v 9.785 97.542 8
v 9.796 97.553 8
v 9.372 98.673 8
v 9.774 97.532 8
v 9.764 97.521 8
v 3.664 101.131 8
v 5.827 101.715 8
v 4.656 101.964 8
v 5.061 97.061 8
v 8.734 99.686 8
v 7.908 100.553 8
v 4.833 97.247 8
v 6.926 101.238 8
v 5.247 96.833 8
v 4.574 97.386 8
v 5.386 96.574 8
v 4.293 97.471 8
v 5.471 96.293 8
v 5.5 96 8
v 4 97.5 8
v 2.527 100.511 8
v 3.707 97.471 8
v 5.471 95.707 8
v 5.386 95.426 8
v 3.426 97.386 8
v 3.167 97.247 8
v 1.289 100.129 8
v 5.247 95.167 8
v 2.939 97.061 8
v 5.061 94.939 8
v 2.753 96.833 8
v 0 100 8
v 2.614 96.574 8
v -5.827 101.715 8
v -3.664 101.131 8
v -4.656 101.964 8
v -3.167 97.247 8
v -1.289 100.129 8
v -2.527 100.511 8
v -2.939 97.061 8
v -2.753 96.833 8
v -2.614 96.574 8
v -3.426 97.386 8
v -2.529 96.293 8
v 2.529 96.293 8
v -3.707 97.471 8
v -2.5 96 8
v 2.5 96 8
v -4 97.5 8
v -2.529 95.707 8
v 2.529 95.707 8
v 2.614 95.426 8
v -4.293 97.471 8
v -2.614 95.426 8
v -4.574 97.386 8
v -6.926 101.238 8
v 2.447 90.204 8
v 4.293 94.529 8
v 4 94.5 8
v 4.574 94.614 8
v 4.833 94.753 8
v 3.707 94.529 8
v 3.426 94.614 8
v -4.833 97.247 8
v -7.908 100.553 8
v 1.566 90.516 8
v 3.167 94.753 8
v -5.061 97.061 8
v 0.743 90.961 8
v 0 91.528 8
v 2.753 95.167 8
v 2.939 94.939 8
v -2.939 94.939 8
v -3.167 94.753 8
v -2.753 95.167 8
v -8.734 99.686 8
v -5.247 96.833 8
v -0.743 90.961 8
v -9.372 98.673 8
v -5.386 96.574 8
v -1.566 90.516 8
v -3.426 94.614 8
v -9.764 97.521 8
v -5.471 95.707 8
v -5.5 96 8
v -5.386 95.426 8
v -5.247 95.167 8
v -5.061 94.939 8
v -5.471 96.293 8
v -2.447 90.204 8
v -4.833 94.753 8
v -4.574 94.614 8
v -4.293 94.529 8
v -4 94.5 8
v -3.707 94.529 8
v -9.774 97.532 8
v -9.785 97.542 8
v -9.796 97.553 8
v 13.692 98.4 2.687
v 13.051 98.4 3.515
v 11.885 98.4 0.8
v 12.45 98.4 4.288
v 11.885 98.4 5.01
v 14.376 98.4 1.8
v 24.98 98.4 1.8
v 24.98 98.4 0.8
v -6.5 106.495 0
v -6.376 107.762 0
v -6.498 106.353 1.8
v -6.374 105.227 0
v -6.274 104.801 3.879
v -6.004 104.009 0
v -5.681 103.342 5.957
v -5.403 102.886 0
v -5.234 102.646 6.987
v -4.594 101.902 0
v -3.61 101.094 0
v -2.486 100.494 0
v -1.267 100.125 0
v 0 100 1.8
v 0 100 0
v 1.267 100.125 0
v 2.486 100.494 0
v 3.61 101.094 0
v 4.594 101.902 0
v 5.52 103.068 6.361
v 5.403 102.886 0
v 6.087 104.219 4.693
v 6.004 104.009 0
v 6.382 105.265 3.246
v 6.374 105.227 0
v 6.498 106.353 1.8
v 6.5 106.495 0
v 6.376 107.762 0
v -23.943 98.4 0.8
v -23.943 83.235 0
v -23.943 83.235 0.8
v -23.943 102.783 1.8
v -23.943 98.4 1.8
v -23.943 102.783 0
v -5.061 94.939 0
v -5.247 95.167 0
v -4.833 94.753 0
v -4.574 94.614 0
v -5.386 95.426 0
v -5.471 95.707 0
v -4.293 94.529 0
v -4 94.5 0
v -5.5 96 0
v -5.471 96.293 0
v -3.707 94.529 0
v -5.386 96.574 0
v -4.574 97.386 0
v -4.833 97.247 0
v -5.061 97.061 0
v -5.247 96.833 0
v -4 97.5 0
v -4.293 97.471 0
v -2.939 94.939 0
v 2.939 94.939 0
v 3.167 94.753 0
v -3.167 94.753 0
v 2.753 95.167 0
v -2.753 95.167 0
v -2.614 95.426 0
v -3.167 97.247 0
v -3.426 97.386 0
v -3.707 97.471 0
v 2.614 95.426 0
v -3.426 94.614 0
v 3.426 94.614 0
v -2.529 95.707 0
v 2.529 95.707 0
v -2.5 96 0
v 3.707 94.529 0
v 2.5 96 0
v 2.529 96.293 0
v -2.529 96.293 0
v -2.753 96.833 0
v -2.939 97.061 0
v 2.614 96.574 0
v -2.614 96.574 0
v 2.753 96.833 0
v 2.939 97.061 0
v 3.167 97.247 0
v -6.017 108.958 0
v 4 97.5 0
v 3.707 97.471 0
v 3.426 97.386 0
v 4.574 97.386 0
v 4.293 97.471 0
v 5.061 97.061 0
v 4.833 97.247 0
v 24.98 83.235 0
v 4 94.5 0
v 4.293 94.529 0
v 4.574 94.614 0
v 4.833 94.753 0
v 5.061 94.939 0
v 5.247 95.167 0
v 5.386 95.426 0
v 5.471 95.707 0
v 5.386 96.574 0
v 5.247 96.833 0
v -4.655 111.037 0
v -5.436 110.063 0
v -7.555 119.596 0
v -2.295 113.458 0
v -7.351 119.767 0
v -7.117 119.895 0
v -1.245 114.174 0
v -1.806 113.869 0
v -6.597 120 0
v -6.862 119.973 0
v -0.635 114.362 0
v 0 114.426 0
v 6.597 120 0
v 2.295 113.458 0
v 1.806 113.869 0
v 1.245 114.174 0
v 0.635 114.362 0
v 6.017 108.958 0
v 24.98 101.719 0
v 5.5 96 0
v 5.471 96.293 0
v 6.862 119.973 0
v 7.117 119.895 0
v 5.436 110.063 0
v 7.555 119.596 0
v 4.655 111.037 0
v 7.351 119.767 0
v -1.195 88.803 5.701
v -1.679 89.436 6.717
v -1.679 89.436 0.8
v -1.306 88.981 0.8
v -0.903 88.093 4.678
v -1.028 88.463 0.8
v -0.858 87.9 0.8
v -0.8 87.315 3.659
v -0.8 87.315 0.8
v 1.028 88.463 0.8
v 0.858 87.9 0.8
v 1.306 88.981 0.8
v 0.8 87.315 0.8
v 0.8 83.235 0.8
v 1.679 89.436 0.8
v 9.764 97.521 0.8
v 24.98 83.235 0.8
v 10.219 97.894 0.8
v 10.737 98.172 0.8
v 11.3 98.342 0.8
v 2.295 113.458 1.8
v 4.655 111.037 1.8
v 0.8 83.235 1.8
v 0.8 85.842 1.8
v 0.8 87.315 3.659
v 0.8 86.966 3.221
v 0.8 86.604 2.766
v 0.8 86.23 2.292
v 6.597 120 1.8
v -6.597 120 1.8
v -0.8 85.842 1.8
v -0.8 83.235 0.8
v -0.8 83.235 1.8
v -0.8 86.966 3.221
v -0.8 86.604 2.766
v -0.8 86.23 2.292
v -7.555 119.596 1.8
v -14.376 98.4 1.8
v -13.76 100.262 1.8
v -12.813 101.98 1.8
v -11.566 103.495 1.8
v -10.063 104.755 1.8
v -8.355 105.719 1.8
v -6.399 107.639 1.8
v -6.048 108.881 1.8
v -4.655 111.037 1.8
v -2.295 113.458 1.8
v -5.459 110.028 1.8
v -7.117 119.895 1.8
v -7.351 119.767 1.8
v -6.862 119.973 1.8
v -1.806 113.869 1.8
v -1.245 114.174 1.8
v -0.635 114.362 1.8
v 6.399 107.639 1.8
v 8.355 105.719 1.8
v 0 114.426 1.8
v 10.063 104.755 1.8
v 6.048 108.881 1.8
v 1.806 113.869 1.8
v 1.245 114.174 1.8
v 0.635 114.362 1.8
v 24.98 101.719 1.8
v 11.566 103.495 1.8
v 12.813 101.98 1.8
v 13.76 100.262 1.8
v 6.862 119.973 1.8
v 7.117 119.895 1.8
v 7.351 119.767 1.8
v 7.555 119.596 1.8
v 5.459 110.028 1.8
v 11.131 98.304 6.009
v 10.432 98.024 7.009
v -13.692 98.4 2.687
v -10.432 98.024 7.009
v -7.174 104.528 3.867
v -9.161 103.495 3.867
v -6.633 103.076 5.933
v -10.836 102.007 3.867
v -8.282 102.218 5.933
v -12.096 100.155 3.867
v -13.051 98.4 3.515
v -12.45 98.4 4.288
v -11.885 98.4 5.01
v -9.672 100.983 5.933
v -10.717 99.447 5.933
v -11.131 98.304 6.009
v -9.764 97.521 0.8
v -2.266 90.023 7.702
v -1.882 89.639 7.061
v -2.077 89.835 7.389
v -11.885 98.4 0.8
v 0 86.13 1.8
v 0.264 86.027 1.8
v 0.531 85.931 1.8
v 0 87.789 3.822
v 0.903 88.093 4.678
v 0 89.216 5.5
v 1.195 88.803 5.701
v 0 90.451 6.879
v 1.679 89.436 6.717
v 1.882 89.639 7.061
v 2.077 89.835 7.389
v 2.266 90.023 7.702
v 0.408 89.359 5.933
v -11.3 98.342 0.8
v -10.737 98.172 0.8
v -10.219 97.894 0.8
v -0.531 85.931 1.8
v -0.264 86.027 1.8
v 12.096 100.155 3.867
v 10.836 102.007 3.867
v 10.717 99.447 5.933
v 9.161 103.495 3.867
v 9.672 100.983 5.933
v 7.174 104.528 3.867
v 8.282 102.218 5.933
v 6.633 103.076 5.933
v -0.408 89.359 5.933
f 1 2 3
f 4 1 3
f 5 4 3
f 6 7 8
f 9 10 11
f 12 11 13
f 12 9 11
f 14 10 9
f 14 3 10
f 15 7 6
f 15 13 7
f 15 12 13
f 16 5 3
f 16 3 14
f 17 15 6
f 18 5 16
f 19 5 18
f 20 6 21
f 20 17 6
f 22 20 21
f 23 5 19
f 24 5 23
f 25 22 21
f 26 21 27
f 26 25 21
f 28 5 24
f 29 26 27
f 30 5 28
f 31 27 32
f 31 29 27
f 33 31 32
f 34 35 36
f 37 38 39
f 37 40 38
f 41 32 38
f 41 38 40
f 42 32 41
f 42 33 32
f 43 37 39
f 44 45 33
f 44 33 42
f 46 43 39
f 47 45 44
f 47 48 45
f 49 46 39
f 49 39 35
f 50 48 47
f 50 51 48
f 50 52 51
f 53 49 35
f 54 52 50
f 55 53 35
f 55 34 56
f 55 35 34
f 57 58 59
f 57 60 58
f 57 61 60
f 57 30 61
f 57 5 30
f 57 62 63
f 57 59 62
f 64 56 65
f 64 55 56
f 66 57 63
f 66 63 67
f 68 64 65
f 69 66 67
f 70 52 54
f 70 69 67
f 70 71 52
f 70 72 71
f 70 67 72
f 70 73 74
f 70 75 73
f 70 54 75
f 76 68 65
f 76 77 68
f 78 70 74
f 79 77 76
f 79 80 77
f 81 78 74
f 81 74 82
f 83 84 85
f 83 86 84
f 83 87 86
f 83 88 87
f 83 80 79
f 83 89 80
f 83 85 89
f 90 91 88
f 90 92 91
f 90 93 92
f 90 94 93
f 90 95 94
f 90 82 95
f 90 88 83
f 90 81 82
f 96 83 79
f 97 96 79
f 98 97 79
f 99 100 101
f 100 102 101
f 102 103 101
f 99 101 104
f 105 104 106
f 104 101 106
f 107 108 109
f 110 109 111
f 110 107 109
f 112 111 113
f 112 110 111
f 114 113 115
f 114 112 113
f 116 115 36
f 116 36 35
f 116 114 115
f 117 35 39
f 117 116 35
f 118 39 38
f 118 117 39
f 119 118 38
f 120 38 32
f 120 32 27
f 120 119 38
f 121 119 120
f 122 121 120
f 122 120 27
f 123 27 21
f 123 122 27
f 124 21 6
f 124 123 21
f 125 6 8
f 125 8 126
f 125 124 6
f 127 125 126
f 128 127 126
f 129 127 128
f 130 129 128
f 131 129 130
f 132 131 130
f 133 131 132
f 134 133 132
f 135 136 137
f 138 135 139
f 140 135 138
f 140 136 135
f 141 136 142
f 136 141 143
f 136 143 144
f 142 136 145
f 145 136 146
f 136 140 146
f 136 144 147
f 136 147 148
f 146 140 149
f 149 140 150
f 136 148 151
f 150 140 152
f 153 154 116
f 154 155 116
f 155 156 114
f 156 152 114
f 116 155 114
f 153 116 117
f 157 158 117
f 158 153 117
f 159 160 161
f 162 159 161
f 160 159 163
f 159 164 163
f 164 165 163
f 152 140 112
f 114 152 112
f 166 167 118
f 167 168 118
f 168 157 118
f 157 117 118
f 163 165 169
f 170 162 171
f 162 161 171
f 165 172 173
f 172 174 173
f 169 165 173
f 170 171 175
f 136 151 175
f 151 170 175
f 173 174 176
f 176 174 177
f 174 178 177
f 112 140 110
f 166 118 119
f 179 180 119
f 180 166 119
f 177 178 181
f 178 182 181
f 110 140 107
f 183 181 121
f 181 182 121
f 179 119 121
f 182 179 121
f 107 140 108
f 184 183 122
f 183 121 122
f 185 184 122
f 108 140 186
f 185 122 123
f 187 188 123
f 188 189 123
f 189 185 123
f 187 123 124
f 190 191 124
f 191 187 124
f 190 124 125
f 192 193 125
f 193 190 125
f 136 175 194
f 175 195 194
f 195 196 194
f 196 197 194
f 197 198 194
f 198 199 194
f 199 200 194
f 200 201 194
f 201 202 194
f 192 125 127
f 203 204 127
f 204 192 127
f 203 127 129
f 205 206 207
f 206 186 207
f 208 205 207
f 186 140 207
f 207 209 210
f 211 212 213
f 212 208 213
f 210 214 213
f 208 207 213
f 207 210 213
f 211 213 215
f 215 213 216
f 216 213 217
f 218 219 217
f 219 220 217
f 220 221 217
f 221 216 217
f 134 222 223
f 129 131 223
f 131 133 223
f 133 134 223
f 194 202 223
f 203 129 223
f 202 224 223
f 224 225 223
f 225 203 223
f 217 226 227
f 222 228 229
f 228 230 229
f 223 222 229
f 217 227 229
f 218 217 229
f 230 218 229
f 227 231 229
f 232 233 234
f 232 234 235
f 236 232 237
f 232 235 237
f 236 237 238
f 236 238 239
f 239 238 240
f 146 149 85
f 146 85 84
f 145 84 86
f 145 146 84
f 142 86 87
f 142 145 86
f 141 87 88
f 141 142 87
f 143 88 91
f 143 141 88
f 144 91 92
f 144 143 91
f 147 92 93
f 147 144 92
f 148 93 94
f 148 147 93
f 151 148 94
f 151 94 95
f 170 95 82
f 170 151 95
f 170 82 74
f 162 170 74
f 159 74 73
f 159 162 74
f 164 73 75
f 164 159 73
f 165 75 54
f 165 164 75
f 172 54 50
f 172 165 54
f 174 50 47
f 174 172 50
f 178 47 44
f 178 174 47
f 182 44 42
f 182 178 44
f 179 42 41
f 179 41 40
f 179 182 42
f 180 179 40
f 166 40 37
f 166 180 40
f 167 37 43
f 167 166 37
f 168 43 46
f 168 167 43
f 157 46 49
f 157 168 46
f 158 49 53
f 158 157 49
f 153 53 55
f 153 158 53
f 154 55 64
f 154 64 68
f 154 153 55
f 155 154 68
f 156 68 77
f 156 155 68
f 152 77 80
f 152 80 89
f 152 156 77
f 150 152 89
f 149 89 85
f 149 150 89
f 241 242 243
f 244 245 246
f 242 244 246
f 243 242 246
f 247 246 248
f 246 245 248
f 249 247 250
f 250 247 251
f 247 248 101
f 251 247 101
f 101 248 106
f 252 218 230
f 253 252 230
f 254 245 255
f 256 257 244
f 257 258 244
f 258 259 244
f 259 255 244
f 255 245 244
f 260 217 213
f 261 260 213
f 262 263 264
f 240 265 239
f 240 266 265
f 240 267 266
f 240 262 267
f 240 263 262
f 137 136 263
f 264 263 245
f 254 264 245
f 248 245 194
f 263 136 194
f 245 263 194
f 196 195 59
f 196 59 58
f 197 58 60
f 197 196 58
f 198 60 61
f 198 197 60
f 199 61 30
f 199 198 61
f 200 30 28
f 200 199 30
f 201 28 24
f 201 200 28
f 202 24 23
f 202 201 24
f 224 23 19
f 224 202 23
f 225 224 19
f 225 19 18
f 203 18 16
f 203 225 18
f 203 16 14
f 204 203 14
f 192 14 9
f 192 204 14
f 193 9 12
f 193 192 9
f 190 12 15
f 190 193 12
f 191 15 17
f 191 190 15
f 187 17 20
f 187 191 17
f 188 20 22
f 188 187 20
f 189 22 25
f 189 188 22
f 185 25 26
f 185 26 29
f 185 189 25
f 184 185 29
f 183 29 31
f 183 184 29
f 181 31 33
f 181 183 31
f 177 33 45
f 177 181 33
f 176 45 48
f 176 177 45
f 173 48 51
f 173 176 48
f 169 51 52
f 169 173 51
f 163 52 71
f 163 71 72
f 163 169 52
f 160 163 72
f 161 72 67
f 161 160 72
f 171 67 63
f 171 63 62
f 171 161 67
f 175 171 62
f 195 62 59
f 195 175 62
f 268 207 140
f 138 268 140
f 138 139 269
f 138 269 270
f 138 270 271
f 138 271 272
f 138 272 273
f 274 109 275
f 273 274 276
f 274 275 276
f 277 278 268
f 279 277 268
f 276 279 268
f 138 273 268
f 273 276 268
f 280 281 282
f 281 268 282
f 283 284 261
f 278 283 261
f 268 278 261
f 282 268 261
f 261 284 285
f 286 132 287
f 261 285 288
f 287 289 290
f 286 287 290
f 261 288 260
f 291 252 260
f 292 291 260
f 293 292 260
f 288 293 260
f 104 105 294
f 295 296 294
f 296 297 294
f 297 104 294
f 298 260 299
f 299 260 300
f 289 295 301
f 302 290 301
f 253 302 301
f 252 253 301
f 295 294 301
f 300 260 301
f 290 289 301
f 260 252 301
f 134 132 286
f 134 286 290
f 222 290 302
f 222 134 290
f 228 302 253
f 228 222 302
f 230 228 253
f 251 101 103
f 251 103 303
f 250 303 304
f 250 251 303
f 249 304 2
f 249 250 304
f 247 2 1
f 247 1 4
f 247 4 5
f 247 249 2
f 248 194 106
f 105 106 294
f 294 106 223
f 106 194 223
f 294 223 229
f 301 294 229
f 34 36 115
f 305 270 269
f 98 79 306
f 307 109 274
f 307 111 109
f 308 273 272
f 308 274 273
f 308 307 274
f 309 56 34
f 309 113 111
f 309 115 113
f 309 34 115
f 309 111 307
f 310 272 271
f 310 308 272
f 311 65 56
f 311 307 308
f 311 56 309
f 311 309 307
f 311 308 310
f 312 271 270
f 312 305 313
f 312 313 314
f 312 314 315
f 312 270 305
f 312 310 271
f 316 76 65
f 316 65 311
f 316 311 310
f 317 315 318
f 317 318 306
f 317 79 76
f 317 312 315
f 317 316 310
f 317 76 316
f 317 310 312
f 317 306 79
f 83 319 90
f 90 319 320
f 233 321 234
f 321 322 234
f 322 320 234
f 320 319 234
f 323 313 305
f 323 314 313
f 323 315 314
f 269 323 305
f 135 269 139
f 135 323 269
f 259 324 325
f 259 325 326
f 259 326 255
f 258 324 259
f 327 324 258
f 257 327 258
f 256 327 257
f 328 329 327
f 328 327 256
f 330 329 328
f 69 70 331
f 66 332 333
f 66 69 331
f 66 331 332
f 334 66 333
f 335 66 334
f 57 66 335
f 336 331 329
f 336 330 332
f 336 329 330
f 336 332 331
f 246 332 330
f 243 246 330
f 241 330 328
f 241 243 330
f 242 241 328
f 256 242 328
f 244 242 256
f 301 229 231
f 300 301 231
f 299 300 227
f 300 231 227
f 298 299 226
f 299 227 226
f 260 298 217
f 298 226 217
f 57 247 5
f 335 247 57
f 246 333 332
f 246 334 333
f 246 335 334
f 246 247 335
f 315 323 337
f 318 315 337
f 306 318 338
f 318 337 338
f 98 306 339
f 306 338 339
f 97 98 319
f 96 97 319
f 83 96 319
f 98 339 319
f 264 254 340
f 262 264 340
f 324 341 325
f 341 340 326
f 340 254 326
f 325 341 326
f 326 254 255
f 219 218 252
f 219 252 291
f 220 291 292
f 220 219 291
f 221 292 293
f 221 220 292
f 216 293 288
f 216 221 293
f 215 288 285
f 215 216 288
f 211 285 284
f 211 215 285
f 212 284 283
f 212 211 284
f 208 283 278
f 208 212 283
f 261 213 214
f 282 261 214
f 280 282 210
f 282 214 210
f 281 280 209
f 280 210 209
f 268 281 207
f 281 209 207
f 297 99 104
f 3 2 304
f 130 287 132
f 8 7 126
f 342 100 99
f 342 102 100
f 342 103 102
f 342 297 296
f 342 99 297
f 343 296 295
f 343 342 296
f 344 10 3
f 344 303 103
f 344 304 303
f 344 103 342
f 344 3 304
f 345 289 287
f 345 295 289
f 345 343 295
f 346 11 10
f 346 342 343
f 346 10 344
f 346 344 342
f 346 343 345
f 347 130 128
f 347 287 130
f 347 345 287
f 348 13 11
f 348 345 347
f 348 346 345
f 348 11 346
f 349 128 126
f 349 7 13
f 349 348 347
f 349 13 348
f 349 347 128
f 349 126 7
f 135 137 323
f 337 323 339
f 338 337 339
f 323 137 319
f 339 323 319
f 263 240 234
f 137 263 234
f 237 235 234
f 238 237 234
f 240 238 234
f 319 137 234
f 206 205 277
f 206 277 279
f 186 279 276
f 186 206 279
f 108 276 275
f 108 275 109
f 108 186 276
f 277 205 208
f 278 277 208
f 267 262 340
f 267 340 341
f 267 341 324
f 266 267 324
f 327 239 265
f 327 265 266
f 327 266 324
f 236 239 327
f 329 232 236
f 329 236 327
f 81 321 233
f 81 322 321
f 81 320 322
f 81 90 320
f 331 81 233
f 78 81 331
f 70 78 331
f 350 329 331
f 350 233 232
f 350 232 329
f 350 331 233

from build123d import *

# Parameters (mm, degrees)
CYLINDER_R       = 1.5
CYLINDER_DEPTH   = 8
ARRAY001_COUNT   = 4
ARRAY004_COUNT   = 4
EXTRUDE003_DEPTH = 1.8
EXTRUDE002_DEPTH = 0.8
ARRAY006_COUNT   = 4
EXTRUDE_DEPTH    = 1
ARRAY002_COUNT   = 4
EXTRUDE006_DEPTH = 1.8
EXTRUDE004_DEPTH = 10
EXTRUDE001_DEPTH = 8
ARRAY005_COUNT   = 4
ARRAY_COUNT      = 4
ARRAY003_COUNT   = 4
SKETCH003_W      = 48.922418
SKETCH003_H      = 39.225639
EXTRUDE005_DEPTH = 10


with BuildPart() as holes:
    # Cylinder → Cylinder (new body)
    with BuildSketch(Plane(origin=(4, 4, 0), x_dir=(1, 0, 0), z_dir=(0, 0, 1))):
        Circle(CYLINDER_R)
    extrude(amount=CYLINDER_DEPTH)

    # Array001: holes ×4 about axis
    array001_axis = Axis((50, 50, 0), (0, 0, 1))


with BuildPart() as holes_1:
    add(holes.part)
    for i in range(1, ARRAY001_COUNT):
        add(holes.part.rotate(array001_axis, i * 360 / ARRAY001_COUNT))

    # Array004: holes ×4 about axis
    array004_axis = Axis((0, 0, 0), (0, 0, 1))


with BuildPart() as holes_2:
    add(holes_1.part)
    for i in range(1, ARRAY004_COUNT):
        add(holes_1.part.rotate(array004_axis, i * 360 / ARRAY004_COUNT))


with BuildPart() as top_hook:
    # Sketch002 → Extrude003 (new body)
    with BuildSketch(Plane.XY):
        with BuildLine():
            Line((26.654903, 100), (7.555178, 119.595928))
            ThreePointArc((7.555178, 119.595928), (7.116991, 119.89485), (6.597081, 120))
            Line((6.597081, 120), (0, 120))
            Line((-6.597081, 120), (0, 120))
            ThreePointArc((-6.597081, 120), (-7.116991, 119.89485), (-7.555178, 119.595928))
            Line((-7.555178, 119.595928), (-26.654903, 100))
            Line((-26.654903, 100), (0, 100))
            Line((0, 100), (26.654903, 100))
        make_face()
        with BuildLine():
            ThreePointArc((-4.654749, 111.036883), (0, 100), (4.654749, 111.036883))
            Line((2.294641, 113.458306), (4.654749, 111.036883))
            ThreePointArc((2.294641, 113.458306), (0, 114.426059), (-2.294641, 113.458306))
            Line((-4.654749, 111.036883), (-2.294641, 113.458306))
        make_face(mode=Mode.SUBTRACT)
    extrude(amount=EXTRUDE003_DEPTH)


with BuildPart() as extrude002:
    # Sketch001 → Extrude002 (new body)
    with BuildSketch(Plane.XY):
        with BuildLine():
            Line((0, 100), (96, 100))
            ThreePointArc((98.828427, 98.828427), (97.530734, 99.695518), (96, 100))
            Line((96, 96), (98.828427, 98.828427))
            Line((4, 4), (96, 96))
            Line((0, 0), (4, 4))
            Line((0, 0), (0, 100))
        make_face()
    extrude(amount=EXTRUDE002_DEPTH)


with BuildPart() as bottom_plate:
    # Part__Mirroring002: instance of Extrude002
    add(extrude002.part.mirror(Plane(origin=(0, 0, 0), x_dir=(1, 0, 0), z_dir=(0, 1, 0))))

    # Fusion003: union Extrude002
    add(extrude002.part)

    # Array006: bottom_plate ×4 about axis
    array006_axis = Axis((0, 0, 0), (0, 0, 1))


with BuildPart() as bottom_plate_1:
    add(bottom_plate.part)
    for i in range(1, ARRAY006_COUNT):
        add(bottom_plate.part.rotate(array006_axis, i * 360 / ARRAY006_COUNT))


with BuildPart() as extrude_body:
    # Sketch → Extrude (new body)
    with BuildSketch(Plane.XY):
        with BuildLine():
            Line((0, 100), (96, 100))
            ThreePointArc((98.828427, 98.828427), (97.530734, 99.695518), (96, 100))
            Line((96, 96), (98.828427, 98.828427))
            Line((4, 4), (96, 96))
            Line((0, 0), (4, 4))
            Line((0, 0), (0, 100))
        make_face()
        with BuildLine():
            Line((0.8, 10.565655), (0.8, 87.314719))
            ThreePointArc((1.67868, 89.436039), (1.028361, 88.462769), (0.8, 87.314719))
            Line((9.763961, 97.52132), (1.67868, 89.436039))
            ThreePointArc((11.885281, 98.4), (10.737231, 98.171639), (9.763961, 97.52132))
            Line((11.885281, 98.4), (90.032525, 98.4))
            ThreePointArc((92.151931, 93.283302), (92.801662, 96.549722), (90.032525, 98.4))
            Line((6.905361, 8.036732), (92.151931, 93.283302))
            ThreePointArc((0.8, 10.565655), (3.007794, 7.261458), (6.905361, 8.036732))
        make_face(mode=Mode.SUBTRACT)
    extrude(amount=EXTRUDE_DEPTH)


with BuildPart() as extrude_body_1:
    # Extrude placement: moved
    add(extrude_body.part.moved(Location((0, 0, 0.8))))


with BuildPart() as fusion002:
    # Part__Mirroring: instance of Extrude body
    add(extrude_body_1.part.mirror(Plane(origin=(0, 0, 0), x_dir=(1, 0, 0), z_dir=(0, 1, 0))))

    # Fusion: union Extrude body
    add(extrude_body_1.part)

    # Array002: Fusion002 ×4 about axis
    array002_axis = Axis((0, 0, 0), (0, 0, 1))


with BuildPart() as fusion002_1:
    add(fusion002.part)
    for i in range(1, ARRAY002_COUNT):
        add(fusion002.part.rotate(array002_axis, i * 360 / ARRAY002_COUNT))

    # Fusion002: union bottom_plate
    add(bottom_plate_1.part)


with BuildPart() as extrude006:
    # Sketch004 → Extrude006 (new body)
    with BuildSketch(Plane.XY):
        with BuildLine():
            Line((-65.833333, 100), (-50, 100))
            Line((-50, 100), (-50, 120))
            Line((-71.666667, 120), (-50, 120))
            ThreePointArc((-71.666667, 120), (-75, 116.666667), (-71.666667, 113.333333))
            Line((-65.833333, 113.333333), (-71.666667, 113.333333))
            ThreePointArc((-62.5, 110), (-63.476311, 112.357023), (-65.833333, 113.333333))
            Line((-62.5, 103.333333), (-62.5, 110))
            ThreePointArc((-65.833333, 100), (-63.476311, 100.976311), (-62.5, 103.333333))
        make_face()
    extrude(amount=EXTRUDE006_DEPTH)


with BuildPart() as part_mirroring003:
    # Part__Mirroring003: instance of Extrude006
    add(extrude006.part.mirror(Plane(origin=(-50, 0, 0), x_dir=(0, -1, 0), z_dir=(1, 0, 0))))


with BuildPart() as cable_hook:
    # Fusion006 base: copy of Extrude006
    add(extrude006.part)

    # Fusion006: union Part__Mirroring003
    add(part_mirroring003.part)


with BuildPart() as hook_zone:
    # Sketch002 → Extrude004 (new body)
    with BuildSketch(Plane.XY):
        with BuildLine():
            Line((26.654903, 100), (7.555178, 119.595928))
            ThreePointArc((7.555178, 119.595928), (7.116991, 119.89485), (6.597081, 120))
            Line((6.597081, 120), (0, 120))
            Line((-6.597081, 120), (0, 120))
            ThreePointArc((-6.597081, 120), (-7.116991, 119.89485), (-7.555178, 119.595928))
            Line((-7.555178, 119.595928), (-26.654903, 100))
            Line((-26.654903, 100), (0, 100))
            Line((0, 100), (26.654903, 100))
        make_face()
        with BuildLine():
            ThreePointArc((-4.654749, 111.036883), (0, 100), (4.654749, 111.036883))
            Line((2.294641, 113.458306), (4.654749, 111.036883))
            ThreePointArc((2.294641, 113.458306), (0, 114.426059), (-2.294641, 113.458306))
            Line((-4.654749, 111.036883), (-2.294641, 113.458306))
        make_face(mode=Mode.SUBTRACT)
    extrude(amount=EXTRUDE004_DEPTH)


with BuildPart() as extrude001:
    # Sketch → Extrude001 (new body)
    with BuildSketch(Plane.XY):
        with BuildLine():
            Line((0, 100), (96, 100))
            ThreePointArc((98.828427, 98.828427), (97.530734, 99.695518), (96, 100))
            Line((96, 96), (98.828427, 98.828427))
            Line((4, 4), (96, 96))
            Line((0, 0), (4, 4))
            Line((0, 0), (0, 100))
        make_face()
        with BuildLine():
            Line((0.8, 10.565655), (0.8, 87.314719))
            ThreePointArc((1.67868, 89.436039), (1.028361, 88.462769), (0.8, 87.314719))
            Line((9.763961, 97.52132), (1.67868, 89.436039))
            ThreePointArc((11.885281, 98.4), (10.737231, 98.171639), (9.763961, 97.52132))
            Line((11.885281, 98.4), (90.032525, 98.4))
            ThreePointArc((92.151931, 93.283302), (92.801662, 96.549722), (90.032525, 98.4))
            Line((6.905361, 8.036732), (92.151931, 93.283302))
            ThreePointArc((0.8, 10.565655), (3.007794, 7.261458), (6.905361, 8.036732))
        make_face(mode=Mode.SUBTRACT)
    extrude(amount=EXTRUDE001_DEPTH)


with BuildPart() as zone_to_cut:
    # Part__Mirroring001: instance of Extrude001
    add(extrude001.part.mirror(Plane(origin=(0, 0, 0), x_dir=(1, 0, 0), z_dir=(0, 1, 0))))

    # Fusion001: union Extrude001
    add(extrude001.part)

    # Array005: zone_to_cut ×4 about axis
    array005_axis = Axis((0, 0, 0), (0, 0, 1))


with BuildPart() as zone_to_cut_1:
    add(zone_to_cut.part)
    for i in range(1, ARRAY005_COUNT):
        add(zone_to_cut.part.rotate(array005_axis, i * 360 / ARRAY005_COUNT))

    # Fusion004: union hook_zone
    add(hook_zone.part)


with BuildPart() as cut:
    # Cone → Cone (revolve)
    with BuildSketch(Plane(origin=(4, 4, 0), x_dir=(1, 0, 0), z_dir=(0, -1, 0))):
        Polygon((0, 0), (12, 0), (6, 8), (0, 8), align=None)
    revolve(axis=Axis((4, 4, 0), (0, 0, 1)))

    # Array: Cut ×4 about axis
    array_axis = Axis((50, 50, 0), (0, 0, 1))


with BuildPart() as cut_1:
    add(cut.part)
    for i in range(1, ARRAY_COUNT):
        add(cut.part.rotate(array_axis, i * 360 / ARRAY_COUNT))

    # Array003: Cut ×4 about axis
    array003_axis = Axis((0, 0, 0), (0, 0, 1))


with BuildPart() as cut_2:
    add(cut_1.part)
    for i in range(1, ARRAY003_COUNT):
        add(cut_1.part.rotate(array003_axis, i * 360 / ARRAY003_COUNT))

    # Common001: intersect zone_to_cut
    add(zone_to_cut_1.part, mode=Mode.INTERSECT)

    # Fusion005: union top_hook, Fusion002, cable_hook
    add(top_hook.part)
    add(fusion002_1.part)
    add(cable_hook.part)

    # Cut: cut holes
    add(holes_2.part, mode=Mode.SUBTRACT)


with BuildPart() as test_print:
    # Sketch003 → Extrude005 (new body)
    with BuildSketch(Plane.XY):
        with Locations((0.518458, 102.847819)):
            Rectangle(SKETCH003_W, SKETCH003_H)
    extrude(amount=EXTRUDE005_DEPTH)

    # Common: intersect Cut
    add(cut_2.part, mode=Mode.INTERSECT)


solid = test_print.part
